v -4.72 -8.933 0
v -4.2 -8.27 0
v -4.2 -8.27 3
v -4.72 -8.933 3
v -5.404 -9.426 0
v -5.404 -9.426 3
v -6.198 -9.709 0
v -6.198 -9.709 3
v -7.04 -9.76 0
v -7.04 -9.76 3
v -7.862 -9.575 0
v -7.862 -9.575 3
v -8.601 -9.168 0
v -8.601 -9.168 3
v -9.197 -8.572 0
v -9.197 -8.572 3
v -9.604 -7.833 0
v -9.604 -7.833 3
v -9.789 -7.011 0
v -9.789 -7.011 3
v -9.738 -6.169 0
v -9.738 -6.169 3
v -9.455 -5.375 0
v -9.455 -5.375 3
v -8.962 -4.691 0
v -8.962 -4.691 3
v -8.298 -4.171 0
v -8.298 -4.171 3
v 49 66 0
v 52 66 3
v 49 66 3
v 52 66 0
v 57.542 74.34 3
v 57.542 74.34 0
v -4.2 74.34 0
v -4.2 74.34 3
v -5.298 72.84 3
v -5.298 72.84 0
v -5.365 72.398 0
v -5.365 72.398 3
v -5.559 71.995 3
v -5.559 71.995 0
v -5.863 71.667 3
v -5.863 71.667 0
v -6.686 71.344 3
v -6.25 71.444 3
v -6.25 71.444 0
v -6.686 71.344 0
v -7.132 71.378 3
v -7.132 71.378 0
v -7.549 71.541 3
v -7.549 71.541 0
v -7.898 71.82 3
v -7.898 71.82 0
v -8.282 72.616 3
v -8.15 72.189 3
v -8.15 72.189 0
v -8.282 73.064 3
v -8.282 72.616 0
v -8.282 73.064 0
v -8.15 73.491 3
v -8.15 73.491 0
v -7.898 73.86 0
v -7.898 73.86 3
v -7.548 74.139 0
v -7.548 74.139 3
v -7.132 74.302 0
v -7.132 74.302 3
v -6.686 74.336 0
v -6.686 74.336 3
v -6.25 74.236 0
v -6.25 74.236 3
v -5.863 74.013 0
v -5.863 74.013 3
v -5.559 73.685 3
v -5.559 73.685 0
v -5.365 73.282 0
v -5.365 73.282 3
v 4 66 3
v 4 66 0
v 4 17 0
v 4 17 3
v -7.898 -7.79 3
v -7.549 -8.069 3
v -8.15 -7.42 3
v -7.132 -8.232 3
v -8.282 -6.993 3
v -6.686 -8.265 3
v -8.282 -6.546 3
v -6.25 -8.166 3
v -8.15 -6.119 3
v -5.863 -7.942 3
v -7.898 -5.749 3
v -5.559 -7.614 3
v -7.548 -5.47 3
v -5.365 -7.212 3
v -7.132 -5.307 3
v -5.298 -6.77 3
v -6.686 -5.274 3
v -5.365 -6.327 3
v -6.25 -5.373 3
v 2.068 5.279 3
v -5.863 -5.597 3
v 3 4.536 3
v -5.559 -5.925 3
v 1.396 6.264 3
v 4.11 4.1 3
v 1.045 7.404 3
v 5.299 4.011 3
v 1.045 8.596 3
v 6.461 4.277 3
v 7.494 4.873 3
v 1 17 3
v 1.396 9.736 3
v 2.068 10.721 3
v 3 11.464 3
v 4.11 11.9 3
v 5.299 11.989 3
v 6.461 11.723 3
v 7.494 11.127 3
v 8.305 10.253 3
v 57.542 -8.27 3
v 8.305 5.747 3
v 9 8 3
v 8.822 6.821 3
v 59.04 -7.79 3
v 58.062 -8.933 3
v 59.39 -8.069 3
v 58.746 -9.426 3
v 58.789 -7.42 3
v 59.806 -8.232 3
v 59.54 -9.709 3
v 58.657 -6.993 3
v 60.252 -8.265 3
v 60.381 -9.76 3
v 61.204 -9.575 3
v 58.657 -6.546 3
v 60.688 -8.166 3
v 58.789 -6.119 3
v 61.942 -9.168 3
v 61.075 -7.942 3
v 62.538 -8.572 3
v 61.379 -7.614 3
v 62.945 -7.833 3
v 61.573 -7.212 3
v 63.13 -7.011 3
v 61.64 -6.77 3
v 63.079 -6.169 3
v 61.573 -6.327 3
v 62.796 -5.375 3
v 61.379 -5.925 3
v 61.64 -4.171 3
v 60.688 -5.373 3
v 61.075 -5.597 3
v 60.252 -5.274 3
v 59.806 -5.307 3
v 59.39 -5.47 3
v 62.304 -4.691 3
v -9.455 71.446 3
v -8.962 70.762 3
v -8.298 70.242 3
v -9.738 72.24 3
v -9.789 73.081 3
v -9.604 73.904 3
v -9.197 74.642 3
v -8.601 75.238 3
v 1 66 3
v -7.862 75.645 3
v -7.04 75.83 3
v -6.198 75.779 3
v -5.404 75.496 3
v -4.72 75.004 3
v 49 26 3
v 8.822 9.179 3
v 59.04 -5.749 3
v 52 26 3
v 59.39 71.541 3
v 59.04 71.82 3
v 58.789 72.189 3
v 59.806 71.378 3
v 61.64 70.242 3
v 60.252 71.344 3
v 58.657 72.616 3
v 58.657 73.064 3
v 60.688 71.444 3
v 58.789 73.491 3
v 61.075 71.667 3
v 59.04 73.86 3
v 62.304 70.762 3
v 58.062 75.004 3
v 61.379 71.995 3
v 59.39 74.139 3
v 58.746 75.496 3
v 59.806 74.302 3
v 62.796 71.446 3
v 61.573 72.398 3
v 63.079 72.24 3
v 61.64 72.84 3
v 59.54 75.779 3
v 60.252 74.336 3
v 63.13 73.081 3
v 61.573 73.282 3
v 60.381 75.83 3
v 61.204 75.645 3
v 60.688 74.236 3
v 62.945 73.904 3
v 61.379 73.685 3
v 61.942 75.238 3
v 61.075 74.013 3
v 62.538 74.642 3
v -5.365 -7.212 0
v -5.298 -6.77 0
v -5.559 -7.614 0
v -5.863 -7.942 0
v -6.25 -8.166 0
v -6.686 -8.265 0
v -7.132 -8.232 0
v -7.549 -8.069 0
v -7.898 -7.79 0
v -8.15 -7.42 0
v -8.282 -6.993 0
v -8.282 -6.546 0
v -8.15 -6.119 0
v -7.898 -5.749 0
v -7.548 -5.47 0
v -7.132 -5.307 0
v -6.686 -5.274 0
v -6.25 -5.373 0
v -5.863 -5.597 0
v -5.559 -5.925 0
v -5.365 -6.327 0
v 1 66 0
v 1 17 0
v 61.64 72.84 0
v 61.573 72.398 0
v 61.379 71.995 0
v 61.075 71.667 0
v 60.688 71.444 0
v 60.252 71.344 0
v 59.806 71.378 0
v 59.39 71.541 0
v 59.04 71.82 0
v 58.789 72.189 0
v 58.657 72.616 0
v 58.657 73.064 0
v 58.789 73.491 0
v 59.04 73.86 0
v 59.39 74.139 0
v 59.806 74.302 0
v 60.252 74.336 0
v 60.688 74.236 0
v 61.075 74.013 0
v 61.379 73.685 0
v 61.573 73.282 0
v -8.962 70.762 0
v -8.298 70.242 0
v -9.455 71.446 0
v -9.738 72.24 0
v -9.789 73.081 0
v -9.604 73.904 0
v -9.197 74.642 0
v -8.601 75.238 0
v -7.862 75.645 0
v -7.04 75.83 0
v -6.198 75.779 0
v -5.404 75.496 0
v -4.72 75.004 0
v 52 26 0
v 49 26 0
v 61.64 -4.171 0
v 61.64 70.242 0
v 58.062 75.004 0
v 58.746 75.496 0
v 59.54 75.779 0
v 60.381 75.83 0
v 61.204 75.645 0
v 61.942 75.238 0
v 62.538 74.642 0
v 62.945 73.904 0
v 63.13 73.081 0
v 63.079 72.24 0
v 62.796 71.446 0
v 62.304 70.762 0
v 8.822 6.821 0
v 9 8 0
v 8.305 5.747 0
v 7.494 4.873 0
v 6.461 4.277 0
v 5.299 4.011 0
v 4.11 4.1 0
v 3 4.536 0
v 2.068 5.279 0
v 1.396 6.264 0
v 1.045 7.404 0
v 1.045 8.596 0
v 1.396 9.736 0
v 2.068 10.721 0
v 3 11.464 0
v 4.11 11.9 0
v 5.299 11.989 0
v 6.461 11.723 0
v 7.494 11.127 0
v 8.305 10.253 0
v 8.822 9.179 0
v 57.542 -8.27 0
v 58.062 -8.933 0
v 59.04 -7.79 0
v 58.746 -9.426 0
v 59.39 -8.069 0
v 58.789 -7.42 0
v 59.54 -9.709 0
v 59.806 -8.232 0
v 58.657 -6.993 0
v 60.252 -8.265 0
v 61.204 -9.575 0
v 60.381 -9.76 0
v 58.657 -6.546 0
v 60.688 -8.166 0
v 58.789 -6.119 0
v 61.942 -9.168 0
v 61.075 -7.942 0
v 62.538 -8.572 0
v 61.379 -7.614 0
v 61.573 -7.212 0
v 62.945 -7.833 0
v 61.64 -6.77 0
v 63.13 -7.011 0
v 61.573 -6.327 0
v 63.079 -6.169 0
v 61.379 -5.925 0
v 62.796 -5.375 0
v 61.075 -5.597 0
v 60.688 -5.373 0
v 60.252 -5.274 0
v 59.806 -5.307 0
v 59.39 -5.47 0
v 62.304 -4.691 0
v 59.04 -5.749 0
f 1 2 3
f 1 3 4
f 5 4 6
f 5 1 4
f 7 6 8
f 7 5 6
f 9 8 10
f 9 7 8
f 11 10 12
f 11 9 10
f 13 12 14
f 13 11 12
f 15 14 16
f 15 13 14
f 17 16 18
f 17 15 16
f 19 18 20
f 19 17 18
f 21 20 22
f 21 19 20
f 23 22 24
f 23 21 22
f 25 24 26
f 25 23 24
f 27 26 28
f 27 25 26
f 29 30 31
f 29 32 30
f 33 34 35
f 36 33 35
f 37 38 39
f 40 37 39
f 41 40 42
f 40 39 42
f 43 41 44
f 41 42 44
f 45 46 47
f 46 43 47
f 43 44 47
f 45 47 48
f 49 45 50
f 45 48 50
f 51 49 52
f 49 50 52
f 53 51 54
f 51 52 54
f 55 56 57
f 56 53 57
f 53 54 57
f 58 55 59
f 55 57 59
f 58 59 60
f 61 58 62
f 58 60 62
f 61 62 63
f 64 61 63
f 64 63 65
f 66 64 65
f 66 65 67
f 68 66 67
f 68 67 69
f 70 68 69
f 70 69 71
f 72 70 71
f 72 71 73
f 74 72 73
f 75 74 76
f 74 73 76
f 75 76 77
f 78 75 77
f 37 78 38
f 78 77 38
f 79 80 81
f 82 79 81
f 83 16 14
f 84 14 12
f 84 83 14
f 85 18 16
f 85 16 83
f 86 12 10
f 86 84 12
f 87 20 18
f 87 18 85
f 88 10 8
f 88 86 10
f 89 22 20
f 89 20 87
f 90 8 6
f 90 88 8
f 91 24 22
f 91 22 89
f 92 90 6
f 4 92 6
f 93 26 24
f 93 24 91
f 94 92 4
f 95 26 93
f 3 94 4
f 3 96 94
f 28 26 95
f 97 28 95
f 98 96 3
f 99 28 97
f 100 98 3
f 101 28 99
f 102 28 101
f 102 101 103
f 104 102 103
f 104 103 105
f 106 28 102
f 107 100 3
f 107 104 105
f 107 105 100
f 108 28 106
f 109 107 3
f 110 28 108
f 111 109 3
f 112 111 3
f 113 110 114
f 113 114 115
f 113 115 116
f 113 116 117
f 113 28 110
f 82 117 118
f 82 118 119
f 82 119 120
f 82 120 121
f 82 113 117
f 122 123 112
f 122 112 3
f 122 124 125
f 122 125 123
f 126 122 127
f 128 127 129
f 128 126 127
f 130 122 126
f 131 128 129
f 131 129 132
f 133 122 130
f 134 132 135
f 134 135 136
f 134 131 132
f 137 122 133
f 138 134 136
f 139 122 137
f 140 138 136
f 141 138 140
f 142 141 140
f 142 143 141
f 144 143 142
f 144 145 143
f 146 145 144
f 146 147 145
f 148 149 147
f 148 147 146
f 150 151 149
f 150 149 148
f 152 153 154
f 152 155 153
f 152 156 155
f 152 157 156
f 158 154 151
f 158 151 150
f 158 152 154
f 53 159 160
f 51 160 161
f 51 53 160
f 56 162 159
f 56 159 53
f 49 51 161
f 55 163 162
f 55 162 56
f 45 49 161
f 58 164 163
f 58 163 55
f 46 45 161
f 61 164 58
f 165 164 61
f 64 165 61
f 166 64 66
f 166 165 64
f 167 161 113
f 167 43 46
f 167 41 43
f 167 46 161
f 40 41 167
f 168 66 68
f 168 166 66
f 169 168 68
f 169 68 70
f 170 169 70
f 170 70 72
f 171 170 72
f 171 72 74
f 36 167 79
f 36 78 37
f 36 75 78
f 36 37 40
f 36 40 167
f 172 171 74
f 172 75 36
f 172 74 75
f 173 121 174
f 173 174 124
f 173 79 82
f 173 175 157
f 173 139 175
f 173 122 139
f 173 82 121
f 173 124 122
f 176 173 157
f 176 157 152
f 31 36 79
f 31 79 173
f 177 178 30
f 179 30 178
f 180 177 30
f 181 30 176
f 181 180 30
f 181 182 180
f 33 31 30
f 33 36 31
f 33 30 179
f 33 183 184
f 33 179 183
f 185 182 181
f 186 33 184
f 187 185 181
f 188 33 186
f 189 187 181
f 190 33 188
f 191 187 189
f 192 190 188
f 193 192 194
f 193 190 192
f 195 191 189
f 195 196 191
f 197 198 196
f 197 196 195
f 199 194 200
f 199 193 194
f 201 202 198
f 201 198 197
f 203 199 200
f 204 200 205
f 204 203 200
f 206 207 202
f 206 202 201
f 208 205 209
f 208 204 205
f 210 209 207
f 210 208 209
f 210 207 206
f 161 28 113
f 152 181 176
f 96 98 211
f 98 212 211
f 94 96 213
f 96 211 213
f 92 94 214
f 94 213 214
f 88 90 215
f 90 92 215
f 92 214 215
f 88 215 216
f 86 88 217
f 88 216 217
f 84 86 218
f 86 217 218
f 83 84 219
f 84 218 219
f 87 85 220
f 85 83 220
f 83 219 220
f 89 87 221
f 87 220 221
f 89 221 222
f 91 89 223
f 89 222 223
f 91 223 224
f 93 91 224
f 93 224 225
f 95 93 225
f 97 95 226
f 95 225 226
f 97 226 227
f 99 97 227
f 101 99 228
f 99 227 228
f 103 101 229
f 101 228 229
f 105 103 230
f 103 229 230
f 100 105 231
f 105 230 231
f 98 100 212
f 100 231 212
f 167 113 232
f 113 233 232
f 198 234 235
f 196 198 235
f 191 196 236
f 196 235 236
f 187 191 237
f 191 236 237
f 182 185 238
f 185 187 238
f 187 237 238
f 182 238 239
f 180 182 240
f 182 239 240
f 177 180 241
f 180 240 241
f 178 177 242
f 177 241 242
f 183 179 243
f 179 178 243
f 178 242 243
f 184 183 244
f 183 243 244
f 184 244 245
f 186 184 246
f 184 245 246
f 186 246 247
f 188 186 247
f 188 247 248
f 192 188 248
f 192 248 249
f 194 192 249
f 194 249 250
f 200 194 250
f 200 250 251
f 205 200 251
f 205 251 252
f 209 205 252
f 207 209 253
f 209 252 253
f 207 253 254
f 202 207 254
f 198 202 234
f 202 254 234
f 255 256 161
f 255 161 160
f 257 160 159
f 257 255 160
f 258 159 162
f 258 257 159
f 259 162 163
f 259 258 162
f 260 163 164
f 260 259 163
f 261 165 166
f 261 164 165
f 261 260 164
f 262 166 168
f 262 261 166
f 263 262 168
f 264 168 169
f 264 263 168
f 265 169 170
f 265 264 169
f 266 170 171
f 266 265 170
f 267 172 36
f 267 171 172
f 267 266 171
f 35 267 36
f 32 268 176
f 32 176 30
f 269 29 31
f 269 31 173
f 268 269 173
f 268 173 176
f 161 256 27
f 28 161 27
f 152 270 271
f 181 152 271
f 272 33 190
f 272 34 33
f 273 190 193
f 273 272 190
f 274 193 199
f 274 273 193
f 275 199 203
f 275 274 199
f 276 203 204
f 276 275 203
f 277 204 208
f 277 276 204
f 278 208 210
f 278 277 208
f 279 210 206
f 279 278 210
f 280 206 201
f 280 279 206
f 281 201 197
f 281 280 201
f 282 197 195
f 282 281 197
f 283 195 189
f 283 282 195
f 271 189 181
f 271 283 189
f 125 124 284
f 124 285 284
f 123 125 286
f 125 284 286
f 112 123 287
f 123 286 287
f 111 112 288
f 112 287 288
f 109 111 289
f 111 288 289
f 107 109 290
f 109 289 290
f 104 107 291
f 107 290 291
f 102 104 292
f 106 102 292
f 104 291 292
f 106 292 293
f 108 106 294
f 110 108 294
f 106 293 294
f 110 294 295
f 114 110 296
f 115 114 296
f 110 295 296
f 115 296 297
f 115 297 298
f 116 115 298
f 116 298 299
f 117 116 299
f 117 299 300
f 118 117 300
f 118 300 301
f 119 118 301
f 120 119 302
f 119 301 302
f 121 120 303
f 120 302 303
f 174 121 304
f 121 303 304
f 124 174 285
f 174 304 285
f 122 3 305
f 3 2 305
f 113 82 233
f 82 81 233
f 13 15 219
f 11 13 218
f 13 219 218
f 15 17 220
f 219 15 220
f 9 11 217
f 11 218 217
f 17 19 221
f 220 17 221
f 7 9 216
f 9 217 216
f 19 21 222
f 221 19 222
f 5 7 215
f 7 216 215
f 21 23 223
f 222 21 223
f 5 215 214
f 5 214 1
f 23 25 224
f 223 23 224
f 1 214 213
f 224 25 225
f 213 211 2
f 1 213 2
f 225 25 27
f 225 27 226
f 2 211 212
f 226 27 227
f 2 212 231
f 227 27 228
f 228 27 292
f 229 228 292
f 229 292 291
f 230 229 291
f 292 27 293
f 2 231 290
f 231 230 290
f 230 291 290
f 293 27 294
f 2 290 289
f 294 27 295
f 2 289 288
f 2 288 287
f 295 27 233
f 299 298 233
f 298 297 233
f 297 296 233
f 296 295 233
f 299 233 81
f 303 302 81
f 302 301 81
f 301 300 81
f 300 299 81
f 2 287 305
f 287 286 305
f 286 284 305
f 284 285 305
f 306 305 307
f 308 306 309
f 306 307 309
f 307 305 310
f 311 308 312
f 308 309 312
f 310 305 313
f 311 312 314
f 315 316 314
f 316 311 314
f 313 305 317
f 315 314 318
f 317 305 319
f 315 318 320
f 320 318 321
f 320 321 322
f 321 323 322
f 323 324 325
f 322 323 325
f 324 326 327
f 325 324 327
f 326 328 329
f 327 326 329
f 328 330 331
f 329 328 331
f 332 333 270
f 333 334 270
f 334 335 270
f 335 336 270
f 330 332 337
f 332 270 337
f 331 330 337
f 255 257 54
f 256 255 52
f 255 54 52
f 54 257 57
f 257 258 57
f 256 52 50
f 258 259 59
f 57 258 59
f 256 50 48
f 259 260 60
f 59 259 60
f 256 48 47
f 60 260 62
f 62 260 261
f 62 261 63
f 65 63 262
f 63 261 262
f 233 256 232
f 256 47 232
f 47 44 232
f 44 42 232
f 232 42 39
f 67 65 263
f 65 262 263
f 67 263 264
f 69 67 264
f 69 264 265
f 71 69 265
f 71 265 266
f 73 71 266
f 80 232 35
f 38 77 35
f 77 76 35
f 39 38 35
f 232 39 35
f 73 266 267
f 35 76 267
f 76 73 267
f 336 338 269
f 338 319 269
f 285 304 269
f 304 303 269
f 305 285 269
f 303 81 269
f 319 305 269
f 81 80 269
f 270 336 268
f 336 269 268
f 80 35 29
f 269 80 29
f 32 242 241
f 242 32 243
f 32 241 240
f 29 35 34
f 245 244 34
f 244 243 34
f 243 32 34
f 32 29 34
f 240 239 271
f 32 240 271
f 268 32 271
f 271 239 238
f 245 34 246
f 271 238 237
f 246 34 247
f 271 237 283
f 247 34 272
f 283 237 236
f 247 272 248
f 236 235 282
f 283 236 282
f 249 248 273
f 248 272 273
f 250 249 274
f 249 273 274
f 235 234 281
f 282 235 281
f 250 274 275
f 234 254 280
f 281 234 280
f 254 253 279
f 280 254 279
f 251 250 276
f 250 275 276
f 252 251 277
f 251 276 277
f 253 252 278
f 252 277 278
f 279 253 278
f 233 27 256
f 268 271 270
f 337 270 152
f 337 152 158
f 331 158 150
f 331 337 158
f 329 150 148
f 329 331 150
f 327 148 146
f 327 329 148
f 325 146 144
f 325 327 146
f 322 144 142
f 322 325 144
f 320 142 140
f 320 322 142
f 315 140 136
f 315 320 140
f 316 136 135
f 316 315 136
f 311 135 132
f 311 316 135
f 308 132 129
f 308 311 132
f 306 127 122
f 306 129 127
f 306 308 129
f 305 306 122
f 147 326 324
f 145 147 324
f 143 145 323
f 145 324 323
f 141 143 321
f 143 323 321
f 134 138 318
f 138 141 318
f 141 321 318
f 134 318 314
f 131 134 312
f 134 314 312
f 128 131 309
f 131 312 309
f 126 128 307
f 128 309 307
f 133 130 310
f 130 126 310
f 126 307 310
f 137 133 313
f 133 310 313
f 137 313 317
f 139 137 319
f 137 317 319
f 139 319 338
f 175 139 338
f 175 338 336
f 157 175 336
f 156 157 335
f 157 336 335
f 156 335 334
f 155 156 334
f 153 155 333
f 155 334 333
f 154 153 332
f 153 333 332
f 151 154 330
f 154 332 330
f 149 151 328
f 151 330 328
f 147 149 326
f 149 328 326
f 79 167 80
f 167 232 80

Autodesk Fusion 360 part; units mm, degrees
sketch "Esquisse1" plane through (0, 0, 0) normal (0, 0, 1) x (1, 0, 0)
  line L0 (0, 0) -> (53.34, 0)
  line L1 (53.34, 0) -> (53.34, 66.04)
  line L2 (48.06, 68.58) -> (15.49, 68.58)
  line L3 (0, 66.04) -> (0, 0)
  line L4 (12.95, 66.04) -> (0, 66.04)
  line L5 (12.95, 66.04) -> (15.49, 68.58)
  line L6 (12.95, 66.04) -> (16.5421, 66.04) construction
  line L7 (50.6, 66.04) -> (53.34, 66.04)
  line L8 (50.6, 66.04) -> (48.06, 68.58)
  line L9 (50.6, 66.04) -> (54.1921, 66.04) construction
  line L10 (0, 0) -> (2.54, 0)
  line L11 (0, 15.24) -> (0, 0)
  line L12 (53.34, 0) -> (50.8, 0)
  line L13 (53.34, 13.97) -> (53.34, 0)
  line L14 (53.34, 66.04) -> (50.6, 66.04)
  line L15 (0, 66.04) -> (12.95, 66.04)
  line L16 (-0.3, 66.04) -> (-0.3, 56.04)
  line L17 (0, 56.04) -> (0, 66.04)
  line L18 (0, 66.04) -> (10, 66.04)
  line L19 (10, 66.34) -> (-0.3, 66.34)
  line L20 (-0.3, 66.34) -> (-0.3, 66.04)
  line L21 (-0.3, 56.04) -> (-3.3, 56.04)
  line L22 (-3.3, 56.04) -> (-3.3, 66.34)
  line L23 (-0.3, 66.34) -> (-0.3, 56.04)
  line L24 (10, 66.34) -> (-0.3, 66.34)
  line L25 (-0.3, 69.34) -> (10, 69.34)
  line L26 (10, 69.34) -> (10, 66.34)
  line L27 (-3.3, 66.34) -> (-3.3, 69.34)
  line L28 (-3.3, 69.34) -> (-0.3, 69.34)
  line L29 (-0.2984, 0.0305) -> (-0.2984, 9.0305)
  line L30 (0, 9) -> (0, 0)
  line L31 (0, 0) -> (9.0015, 0)
  line L32 (9.0015, -0.2695) -> (-0.2984, -0.2695)
  line L33 (-0.2984, -0.2695) -> (-0.2984, 0.0305)
  line L34 (-0.2984, 9.0305) -> (-3.2984, 9.0305)
  line L35 (-3.2984, 9.0305) -> (-3.2984, -0.3)
  line L36 (-0.2984, -0.2695) -> (-0.2984, 9.0305)
  line L37 (9.0015, -0.2695) -> (0.0015, -0.2695)
  line L38 (0, 0) -> (0, 2.7305)
  line L39 (9.0015, -0.2695) -> (-0.2984, -0.2695)
  line L40 (-3.2984, -0.3) -> (-3.2984, -3.2695)
  line L41 (-3.2984, -3.2695) -> (9.0015, -3.2695)
  line L42 (9.0015, -3.2695) -> (9.0015, -0.2695)
  line L43 (53.34, 0) -> (53.34, 33.02)
  line L44 (53.64, 33.02) -> (53.64, 43.02)
  line L45 (53.34, 43.02) -> (53.34, 33.02)
  line L46 (53.64, 33.02) -> (53.64, 23.02)
  line L47 (53.64, 43.02) -> (56.64, 43.02)
  line L48 (56.64, 43.02) -> (56.64, 23.02)
  line L49 (56.64, 23.02) -> (53.64, 23.02)
  line L50 (53.64, 23.02) -> (53.64, 43.02)
  circle A0 centre (45.72, 66.04) radius 1.5
  circle A1 centre (17.78, 66.04) radius 1.5
  circle A2 centre (50.8, 13.97) radius 1.5
  circle A3 centre (2.54, 15.24) radius 1.5
  line L51 (-3.2985, -8.2695) -> (-8.2985, -8.2695)
  line L52 (56.64, 74.34) -> (61.64, 74.34)
  line L53 (-8.2985, -8.2695) -> (61.64, -8.2695)
  line L54 (61.64, -8.2695) -> (61.64, 74.34)
  line L55 (61.64, 74.34) -> (-8.2985, 74.34)
  line L56 (-8.2985, 74.34) -> (-8.2985, -8.2695)
  line L57 (-8.2985, 74.34) -> (-8.2985, 71.34)
  line L58 (-5.2985, 71.34) -> (58.64, 71.34)
  line L59 (-8.2985, -8.2695) -> (-5.2985, -8.2695)
  line L60 (-8.2985, -5.2695) -> (-8.2985, -8.2695)
  line L61 (-5.2985, -5.2695) -> (-5.2985, 71.34)
  line L62 (61.64, -8.2695) -> (58.64, -8.2695)
  line L63 (61.64, -5.2695) -> (61.64, -8.2695)
  line L64 (61.64, 74.34) -> (58.64, 74.34)
  line L65 (61.64, 71.34) -> (61.64, 74.34)
  line L66 (58.64, 71.34) -> (58.64, -5.2695)
  line L67 (-5.2985, -5.2695) -> (58.64, -5.2695)
  line L68 (61.64, 74.34) -> (60.14, 74.34)
  line L69 (60.14, 74.34) -> (60.14, 72.84)
  line L70 (60.14, 72.84) -> (61.64, 72.84)
  line L71 (61.64, 72.84) -> (61.64, 74.34)
  circle A4 centre (60.14, 72.84) radius 3
  line L72 (61.64, -8.2695) -> (60.14, -8.2695)
  line L73 (60.14, -8.2695) -> (60.14, -6.7695)
  line L74 (60.14, -6.7695) -> (61.64, -6.7695)
  line L75 (61.64, -6.7695) -> (61.64, -8.2695)
  circle A5 centre (60.14, -6.7695) radius 3
  line L76 (-8.2985, -8.2695) -> (-6.7985, -8.2695)
  line L77 (-6.7985, -8.2695) -> (-6.7985, -6.7695)
  line L78 (-6.7985, -6.7695) -> (-8.2985, -6.7695)
  line L79 (-8.2985, -6.7695) -> (-8.2985, -8.2695)
  circle A6 centre (-6.7985, -6.7695) radius 3
  line L80 (-8.2985, 74.34) -> (-6.7985, 74.34)
  line L81 (-6.7985, 74.34) -> (-6.7985, 72.84)
  line L82 (-6.7985, 72.84) -> (-8.2985, 72.84)
  line L83 (-8.2985, 72.84) -> (-8.2985, 74.34)
  circle A7 centre (-6.7985, 72.84) radius 3
  dimension "LargeurArduino" = 53.34
  dimension "d5" = 45
  dimension "d8" = 135
  dimension "d9" = 17.78
  dimension "d10" = 7.62
  dimension "d13" = 2.54
  dimension "d14" = 15.24
  dimension "d15" = 2.54
  dimension "d16" = 13.97
  dimension "DistanceMorsArduino" = 0.3
  dimension "d27" = 10
  dimension "d28" = 10.3
  dimension "d29" = 0.3
  dimension "d30" = 3
  dimension "d31" = 10.3
  dimension "d32" = 10.3
  dimension "d33" = 3
  dimension "d34" = 3
  dimension "d35" = 3
  dimension "d36" = 0.3
  dimension "d37" = 9
  dimension "d38" = 9.3
  dimension "d39" = 0.3
  dimension "d40" = 3
  dimension "d41" = 9.3
  dimension "d42" = 9
  dimension "d44" = 12.3
  dimension "d45" = 3
  dimension "d46" = 33.02
  dimension "d47" = 0.3
  dimension "d48" = 10
  dimension "d49" = 0.3
  dimension "d51" = 3
  dimension "d52" = 20
  dimension "d54" = 3
  dimension "d55" = 3
  dimension "d56" = 3
  dimension "d59" = 5
  dimension "d60" = 5
  dimension "d63" = 5
  dimension "EpaisseurBoitier" = 3
  dimension "d65" = 3
  dimension "d66" = 3
  dimension "d67" = 3
  dimension "d68" = 3
  dimension "d69" = 3
  dimension "d70" = 3
  dimension "d71" = 3
  dimension "d72" = 1.5
  dimension "d73" = 1.5
  dimension "d74" = 6
  dimension "d75" = 1.5
  dimension "d76" = 1.5
  dimension "d77" = 6
  dimension "d78" = 1.5
  dimension "d79" = 1.5
  dimension "d80" = 6
  dimension "d81" = 1.5
  dimension "d82" = 1.5
  dimension "d83" = 6
sketch "Esquisse10" plane through (0, 0, 0) normal (0, 0, 1) x (1, 0, 0)
sketch "Esquisse9" plane through (0, 0, 0) normal (0, 0, 1) x (1, 0, 0)
sketch "Esquisse2" plane through (0, 0, 0) normal (0, 0, 1) x (1, 0, 0)
sketch "Esquisse13" plane through (0, 0, 0) normal (0, 0, 1) x (1, 0, 0)
sketch "Esquisse11" plane through (0, 0, 0) normal (0, 0, 1) x (1, 0, 0)
  line L0 (0, 66) -> (1, 66)
  line L1 (1, 66) -> (4, 66)
  line L2 (4, 66) -> (4, 17)
  line L3 (4, 17) -> (1, 17)
  line L4 (1, 17) -> (1, 66)
  line L5 (53, 66) -> (52, 66)
  line L6 (52, 66) -> (49, 66)
  line L7 (49, 66) -> (49, 26)
  line L8 (49, 26) -> (52, 26)
  line L9 (52, 26) -> (52, 66)
  line L10 (0, 0) -> (5, 0)
  line L11 (5, 0) -> (5, 8)
  line L12 (5, 8) -> (0, 8)
  line L13 (0, 8) -> (0, 0)
  circle A0 centre (5, 8) radius 4
  dimension "d157" = 1
  dimension "d158" = 3
  dimension "d159" = 49
  dimension "d160" = 1
  dimension "d161" = 3
  dimension "d162" = 40
  dimension "d163" = 5
  dimension "d164" = 8
  dimension "d165" = 8
extrude "Extrusion15" add sketch "Esquisse11" sketch "Esquisse1" along normal blind 3 of sketch 2 contours L0 L1 L2 L3 L4 L5 L7 L8 L10 L11 L12 L13 L14 L15 L17 L18 L30 L31 L38 L43 L45 | L16 L19 L20 L21 L22 L23 L24 L25 L26 L27 L28 | L29 L32 L33 L34 L35 L36 L37 L39 L40 L41 L42 | L44 L46 L47 L48 L49 L50 | A0 | A1 | A2 | A3 | L51 L53 L56 L59 L60 L76 L79 A6 | L51 L53 L56 L59 L60 L61 L67 L77 L78 A6 | L51 L53 L56 L59 L60 L76 L77 L78 L79 | L51 L53 L67 A5 A6 | L56 L61 A6 A7 | L53 L54 L62 L63 L66 L67 L73 L74 A5 | L53 L54 L62 L63 L72 L75 A5 | L55 L56 L57 L80 L83 A7 | L55 L56 L57 L58 L61 L81 L82 A7 | L61 L67 A6 | L58 L61 L66 L67 A4 A5 A6 A7 | L66 L67 A5 | L52 L55 L58 A4 A7 | L58 L61 A7 | L53 L54 L62 L63 L72 L73 L74 L75 | L54 L66 A4 A5 | L55 L56 L57 L80 L81 L82 L83 | L58 L66 A4 | L52 L54 L55 L58 L64 L65 L66 L69 L70 A4 | L52 L54 L55 L64 L65 L68 L71 A4 | L52 L54 L55 L64 L65 L68 L69 L70 L71
sketch "Esquisse12" plane through (0, 0, 0) normal (0, 0, 1) x (1, 0, 0)
sketch "Esquisse14" plane through (0, 0, 0) normal (0, 0, 1) x (1, 0, 0)
extrude "Extrusion16" cut sketch "Esquisse11" along normal blind 15 contours L11 L12 A0 | L11 L12 A0
extrude "Extrusion17" cut sketch "Esquisse11" along normal blind 5 contours L6 L7 L8 L9
extrude "Extrusion18" cut sketch "Esquisse11" along normal blind 5 contours L1 L2 L3 L4
sketch "Esquisse15" plane through (0, 0, 0) normal (0, 0, 1) x (1, 0, 0)
  circle A0 centre (-6.7985, 72.84) radius 1.5
  circle A1 centre (60.14, 72.84) radius 1.5
  circle A2 centre (-6.7985, -6.7695) radius 1.5
  circle A3 centre (60.14, -6.7695) radius 1.5
  point P0 (-6.7985, 72.84)
  point P1 (60.14, 72.84)
  point P2 (-6.7985, 72.84)
  point P3 (-6.7985, -6.7695)
  point P4 (60.14, -6.7695)
  dimension "d174" = 3
  dimension "d175" = 3
  dimension "d176" = 3
  dimension "d177" = 3
extrude "Extrusion19" cut sketch "Esquisse15" along normal blind 3
sketch "Esquisse16" plane through (0, 0, 3) normal (0, 0, 1) x (-1, 0, 0)
  circle A0 centre (-60.14, -72.84) radius 1.5
  circle A1 centre (6.7985, 6.7695) radius 1.5
  circle A2 centre (6.7985, -72.84) radius 1.5
  circle A3 centre (-60.14, 6.7695) radius 1.5
  line L0 (-1, -17) -> (-1, -66)
  line L1 (-1, -66) -> (-4, -66)
  line L2 (-4, -66) -> (-4, -17)
  line L3 (-4, -17) -> (-1, -17)
  line L4 (-52, -26) -> (-49, -26)
  line L5 (-49, -26) -> (-49, -66)
  line L6 (-49, -66) -> (-52, -66)
  line L7 (-52, -66) -> (-52, -26)
  circle A4 centre (-5, -8) radius 4
  line L8 (-57.5419, -74.34) -> (4.2004, -74.34)
  arc A5 (4.2004, -74.34) -> (8.2985, -70.2419) centre (6.7985, -72.84) ccw
  line L9 (8.2985, -70.2419) -> (8.2985, 4.1714)
  arc A6 (8.2985, 4.1714) -> (4.2004, 8.2695) centre (6.7985, 6.7695) ccw
  line L10 (4.2004, 8.2695) -> (-57.5419, 8.2695)
  arc A7 (-57.5419, 8.2695) -> (-61.64, 4.1714) centre (-60.14, 6.7695) ccw
  line L11 (-61.64, 4.1714) -> (-61.64, -70.2419)
  arc A8 (-61.64, -70.2419) -> (-57.5419, -74.34) centre (-60.14, -72.84) ccw
  line L12 (-39.0942, -3.1233) -> (-39.3144, -74.255) construction
  line L13 (-39.3144, -74.255) -> (-11.8714, -74.34) construction
  line L14 (-11.8714, -74.34) -> (-11.6511, -3.2083) construction
  line L15 (-11.6511, -3.2083) -> (-39.0942, -3.1233) construction
  dimension "d180" = 10
component "CouvercleArduino" placed x (1, 0, 0) y (0, 1, 0) z (0, 0, 1) at (0, 0, 0)
equation "LongueurArduino = 68.58 mm"
equation "DiamètreArduino = 3.2 mm"
equation "LargeurBoitier = 90 mm"
equation "LongueurBoitier = 100 mm"
equation "EpaisseurMors = 3 mm"
equation "d29 = DistanceMorsArduino"
equation "d30 = EpaisseurMors"
equation "d33 = EpaisseurMors"
equation "d36 = DistanceMorsArduino"
equation "d39 = DistanceMorsArduino"
equation "d40 = EpaisseurMors"
equation "d45 = EpaisseurMors"
equation "d47 = DistanceMorsArduino"
equation "d49 = DistanceMorsArduino"
equation "d51 = EpaisseurMors"
equation "DiamètreMors = 3 mm"
equation "d54 = DiamètreMors"
equation "d55 = DiamètreMors"
equation "d56 = DiamètreMors"
equation "DistanceMorsBoitier = 5 mm"
equation "d59 = DistanceMorsBoitier"
equation "d60 = DistanceMorsBoitier"
equation "d63 = DistanceMorsBoitier"
equation "d65 = EpaisseurBoitier"
equation "d66 = EpaisseurBoitier"
equation "d67 = EpaisseurBoitier"
equation "d68 = EpaisseurBoitier"
equation "d69 = EpaisseurBoitier"
equation "d70 = EpaisseurBoitier"
equation "d71 = EpaisseurBoitier"
equation "d72 = EpaisseurBoitier / 2"
equation "d73 = EpaisseurBoitier / 2"
equation "d74 = EpaisseurBoitier * 2"
equation "d75 = EpaisseurBoitier / 2"
equation "d76 = EpaisseurBoitier / 2"
equation "d77 = EpaisseurBoitier * 2"
equation "d78 = EpaisseurBoitier / 2"
equation "d79 = EpaisseurBoitier / 2"
equation "d80 = EpaisseurBoitier * 2"
equation "d81 = EpaisseurBoitier / 2"
equation "d82 = EpaisseurBoitier / 2"
equation "d83 = EpaisseurBoitier * 2"
equation "HauteurMors = 5 mm"
equation "HauteurBoitier = 25 mm"
equation "CongéMors = 1 mm"
equation "DiamètreVis = 3 mm"
equation "mm = 1 mm"
equation "d174 = DiamètreVis"
equation "d175 = DiamètreVis"
equation "d176 = DiamètreVis"
equation "d177 = DiamètreVis"
equation "d128 = LargeurArduino"
equation "d129 = LongueurArduino - 2.54 mm"
equation "d139 = DiamètreVis"
equation "d140 = DiamètreVis"
equation "d141 = DiamètreVis"
equation "d150 = DiamètreVis"
equation "d151 = DiamètreVis"
equation "d152 = DiamètreVis"
equation "d153 = DiamètreVis"
